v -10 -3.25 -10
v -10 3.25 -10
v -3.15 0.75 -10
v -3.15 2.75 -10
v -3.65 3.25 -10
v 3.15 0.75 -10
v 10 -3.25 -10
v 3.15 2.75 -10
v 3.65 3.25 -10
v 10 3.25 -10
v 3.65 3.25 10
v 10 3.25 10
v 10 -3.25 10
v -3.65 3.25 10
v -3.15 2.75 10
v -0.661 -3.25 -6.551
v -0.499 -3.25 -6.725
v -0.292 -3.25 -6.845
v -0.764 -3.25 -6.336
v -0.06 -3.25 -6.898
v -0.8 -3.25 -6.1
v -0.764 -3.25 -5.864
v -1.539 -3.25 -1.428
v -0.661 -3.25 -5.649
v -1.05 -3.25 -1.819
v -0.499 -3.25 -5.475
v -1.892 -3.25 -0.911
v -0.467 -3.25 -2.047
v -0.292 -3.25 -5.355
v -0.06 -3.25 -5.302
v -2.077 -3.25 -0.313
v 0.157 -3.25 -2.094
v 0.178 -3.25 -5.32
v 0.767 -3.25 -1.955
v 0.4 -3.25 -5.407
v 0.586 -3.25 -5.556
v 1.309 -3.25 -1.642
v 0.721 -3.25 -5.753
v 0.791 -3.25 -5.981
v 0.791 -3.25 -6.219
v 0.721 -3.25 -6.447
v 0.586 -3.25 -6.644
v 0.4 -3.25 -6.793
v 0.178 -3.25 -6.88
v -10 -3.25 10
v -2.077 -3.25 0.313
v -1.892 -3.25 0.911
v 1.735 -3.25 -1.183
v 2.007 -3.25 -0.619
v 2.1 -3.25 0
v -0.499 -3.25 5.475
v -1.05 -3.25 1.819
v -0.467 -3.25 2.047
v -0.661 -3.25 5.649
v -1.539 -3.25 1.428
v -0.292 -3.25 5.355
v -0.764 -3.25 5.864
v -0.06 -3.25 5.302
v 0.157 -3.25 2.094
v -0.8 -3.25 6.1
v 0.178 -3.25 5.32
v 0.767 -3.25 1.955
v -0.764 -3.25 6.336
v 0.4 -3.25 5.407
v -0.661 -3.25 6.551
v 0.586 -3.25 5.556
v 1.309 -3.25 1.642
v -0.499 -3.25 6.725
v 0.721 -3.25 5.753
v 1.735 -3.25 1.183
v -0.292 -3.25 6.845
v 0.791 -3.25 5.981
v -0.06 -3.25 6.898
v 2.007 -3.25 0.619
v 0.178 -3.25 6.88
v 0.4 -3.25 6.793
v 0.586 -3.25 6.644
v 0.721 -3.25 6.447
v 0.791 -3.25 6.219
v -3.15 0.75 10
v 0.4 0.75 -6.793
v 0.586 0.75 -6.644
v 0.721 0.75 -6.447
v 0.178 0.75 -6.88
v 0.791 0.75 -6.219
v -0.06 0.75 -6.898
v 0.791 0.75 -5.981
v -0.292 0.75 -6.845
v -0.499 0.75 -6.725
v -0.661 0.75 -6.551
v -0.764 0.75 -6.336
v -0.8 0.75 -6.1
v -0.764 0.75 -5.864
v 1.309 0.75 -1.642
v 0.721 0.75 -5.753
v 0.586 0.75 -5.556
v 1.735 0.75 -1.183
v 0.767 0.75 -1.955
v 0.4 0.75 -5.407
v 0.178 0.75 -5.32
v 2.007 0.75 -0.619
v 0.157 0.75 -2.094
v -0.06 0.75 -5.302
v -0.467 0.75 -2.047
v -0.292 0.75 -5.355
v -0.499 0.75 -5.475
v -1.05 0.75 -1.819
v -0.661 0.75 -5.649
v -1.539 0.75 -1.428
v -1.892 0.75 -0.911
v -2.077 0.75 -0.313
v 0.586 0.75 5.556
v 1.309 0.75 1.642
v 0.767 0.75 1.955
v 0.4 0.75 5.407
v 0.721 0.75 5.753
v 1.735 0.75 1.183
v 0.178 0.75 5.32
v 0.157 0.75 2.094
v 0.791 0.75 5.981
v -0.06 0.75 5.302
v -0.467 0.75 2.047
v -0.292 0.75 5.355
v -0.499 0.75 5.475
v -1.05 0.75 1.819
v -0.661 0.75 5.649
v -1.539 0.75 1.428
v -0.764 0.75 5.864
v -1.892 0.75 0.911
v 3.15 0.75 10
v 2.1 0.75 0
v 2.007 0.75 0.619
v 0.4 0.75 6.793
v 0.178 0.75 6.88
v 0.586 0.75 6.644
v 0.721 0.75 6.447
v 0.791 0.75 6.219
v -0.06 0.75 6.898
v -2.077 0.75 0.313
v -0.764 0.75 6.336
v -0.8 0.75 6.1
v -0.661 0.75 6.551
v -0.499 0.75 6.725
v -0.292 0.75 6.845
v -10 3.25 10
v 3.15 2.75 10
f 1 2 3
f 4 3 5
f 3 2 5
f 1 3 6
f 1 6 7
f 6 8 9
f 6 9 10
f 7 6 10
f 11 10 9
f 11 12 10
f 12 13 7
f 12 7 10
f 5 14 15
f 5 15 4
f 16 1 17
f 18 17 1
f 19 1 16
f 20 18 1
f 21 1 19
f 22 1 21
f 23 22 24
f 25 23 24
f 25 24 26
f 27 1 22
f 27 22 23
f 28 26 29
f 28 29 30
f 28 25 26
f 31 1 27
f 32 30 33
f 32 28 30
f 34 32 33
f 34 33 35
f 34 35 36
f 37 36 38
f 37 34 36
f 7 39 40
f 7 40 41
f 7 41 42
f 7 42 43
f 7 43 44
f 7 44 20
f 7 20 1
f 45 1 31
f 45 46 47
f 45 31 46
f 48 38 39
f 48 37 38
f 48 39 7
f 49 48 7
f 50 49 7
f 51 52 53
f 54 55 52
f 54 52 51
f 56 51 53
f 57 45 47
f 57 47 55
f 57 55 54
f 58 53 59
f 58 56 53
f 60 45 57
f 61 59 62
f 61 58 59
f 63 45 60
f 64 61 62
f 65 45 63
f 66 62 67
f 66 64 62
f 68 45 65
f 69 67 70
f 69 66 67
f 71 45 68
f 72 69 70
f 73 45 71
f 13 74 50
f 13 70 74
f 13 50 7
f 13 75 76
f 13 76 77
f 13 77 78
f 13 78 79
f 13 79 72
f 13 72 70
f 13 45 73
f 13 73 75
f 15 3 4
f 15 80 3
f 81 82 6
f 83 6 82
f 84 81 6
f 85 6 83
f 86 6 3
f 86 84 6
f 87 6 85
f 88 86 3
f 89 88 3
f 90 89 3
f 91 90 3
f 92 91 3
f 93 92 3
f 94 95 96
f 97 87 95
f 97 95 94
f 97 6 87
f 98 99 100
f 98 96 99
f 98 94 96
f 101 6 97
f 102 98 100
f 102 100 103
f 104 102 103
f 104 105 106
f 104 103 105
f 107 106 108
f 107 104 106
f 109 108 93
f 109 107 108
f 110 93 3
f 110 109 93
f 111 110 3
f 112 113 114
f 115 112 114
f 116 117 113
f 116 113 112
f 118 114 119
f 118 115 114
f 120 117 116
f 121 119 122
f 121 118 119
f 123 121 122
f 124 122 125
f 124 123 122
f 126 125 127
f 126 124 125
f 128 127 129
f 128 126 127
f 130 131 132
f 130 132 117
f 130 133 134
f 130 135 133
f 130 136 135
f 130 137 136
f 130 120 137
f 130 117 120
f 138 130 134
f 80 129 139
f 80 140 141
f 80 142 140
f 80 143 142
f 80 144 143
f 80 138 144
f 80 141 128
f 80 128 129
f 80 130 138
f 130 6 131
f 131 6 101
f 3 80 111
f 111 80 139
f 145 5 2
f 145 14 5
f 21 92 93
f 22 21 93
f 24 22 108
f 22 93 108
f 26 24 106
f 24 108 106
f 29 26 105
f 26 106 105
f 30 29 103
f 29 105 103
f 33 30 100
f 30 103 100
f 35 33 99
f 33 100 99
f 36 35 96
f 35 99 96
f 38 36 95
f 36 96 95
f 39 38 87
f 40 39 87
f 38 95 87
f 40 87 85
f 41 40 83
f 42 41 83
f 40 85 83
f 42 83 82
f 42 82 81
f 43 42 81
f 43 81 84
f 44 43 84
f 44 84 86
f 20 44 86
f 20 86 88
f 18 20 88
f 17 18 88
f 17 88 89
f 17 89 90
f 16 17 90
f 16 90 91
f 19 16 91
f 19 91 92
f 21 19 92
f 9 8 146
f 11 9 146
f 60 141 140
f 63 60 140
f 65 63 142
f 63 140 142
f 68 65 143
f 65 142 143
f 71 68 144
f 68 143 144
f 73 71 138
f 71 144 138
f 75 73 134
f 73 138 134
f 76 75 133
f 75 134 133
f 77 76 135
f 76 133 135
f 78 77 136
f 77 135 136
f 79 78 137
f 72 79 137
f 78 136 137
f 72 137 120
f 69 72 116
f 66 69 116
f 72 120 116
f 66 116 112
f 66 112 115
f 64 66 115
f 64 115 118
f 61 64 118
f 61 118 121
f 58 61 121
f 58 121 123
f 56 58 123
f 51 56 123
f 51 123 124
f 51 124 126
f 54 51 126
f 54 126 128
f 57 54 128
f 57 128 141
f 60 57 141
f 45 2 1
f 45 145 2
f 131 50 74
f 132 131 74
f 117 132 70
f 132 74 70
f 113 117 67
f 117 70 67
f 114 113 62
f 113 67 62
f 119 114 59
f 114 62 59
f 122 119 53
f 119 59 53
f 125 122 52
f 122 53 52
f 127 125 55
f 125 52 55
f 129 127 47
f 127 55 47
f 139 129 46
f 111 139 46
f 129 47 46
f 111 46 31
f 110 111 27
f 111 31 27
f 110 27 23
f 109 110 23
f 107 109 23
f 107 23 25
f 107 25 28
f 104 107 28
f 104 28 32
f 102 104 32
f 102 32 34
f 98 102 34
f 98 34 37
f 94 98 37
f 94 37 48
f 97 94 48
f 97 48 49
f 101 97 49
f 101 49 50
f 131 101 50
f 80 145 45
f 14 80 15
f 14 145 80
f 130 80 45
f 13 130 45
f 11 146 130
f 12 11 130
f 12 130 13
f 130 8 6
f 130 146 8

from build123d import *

# Parameters (mm, degrees)
F1_DEPTH = 10
F3_D     = 1.6
F3_DEPTH = 6
F2_R     = 2.1
F4_DEPTH = 25
F5_SIZE  = 0.5


with BuildPart() as f1:
    # F0 (on Top) → F1 (new body, symmetric)
    with BuildSketch(Plane.XY):
        Polygon((-10, -3.25), (10, -3.25), (10, 3.25), (3.15, 3.25), (3.15, 0.75), (-3.15, 0.75), (-3.15, 3.25), (-10, 3.25), align=None)
    extrude(amount=F1_DEPTH, both=True)

    # F3
    with Locations(Plane.XZ.offset(3.25)):
        with Locations((0, 6.1), (0, -6.1)):
            Hole(F3_D / 2, depth=F3_DEPTH)

    # F2 (on face) → F4 (cut)
    with BuildSketch(Plane.XZ.offset(3.25)):
        Circle(F2_R)
    extrude(amount=-F4_DEPTH, mode=Mode.SUBTRACT)

    # F5
    f5_edges = [f1.edges().sort_by_distance(p)[0] for p in [
        (-3.15, 3.25, 0),
        (3.15, 3.25, 0),
    ]]
    chamfer(f5_edges, length=F5_SIZE)


solid = f1.part
